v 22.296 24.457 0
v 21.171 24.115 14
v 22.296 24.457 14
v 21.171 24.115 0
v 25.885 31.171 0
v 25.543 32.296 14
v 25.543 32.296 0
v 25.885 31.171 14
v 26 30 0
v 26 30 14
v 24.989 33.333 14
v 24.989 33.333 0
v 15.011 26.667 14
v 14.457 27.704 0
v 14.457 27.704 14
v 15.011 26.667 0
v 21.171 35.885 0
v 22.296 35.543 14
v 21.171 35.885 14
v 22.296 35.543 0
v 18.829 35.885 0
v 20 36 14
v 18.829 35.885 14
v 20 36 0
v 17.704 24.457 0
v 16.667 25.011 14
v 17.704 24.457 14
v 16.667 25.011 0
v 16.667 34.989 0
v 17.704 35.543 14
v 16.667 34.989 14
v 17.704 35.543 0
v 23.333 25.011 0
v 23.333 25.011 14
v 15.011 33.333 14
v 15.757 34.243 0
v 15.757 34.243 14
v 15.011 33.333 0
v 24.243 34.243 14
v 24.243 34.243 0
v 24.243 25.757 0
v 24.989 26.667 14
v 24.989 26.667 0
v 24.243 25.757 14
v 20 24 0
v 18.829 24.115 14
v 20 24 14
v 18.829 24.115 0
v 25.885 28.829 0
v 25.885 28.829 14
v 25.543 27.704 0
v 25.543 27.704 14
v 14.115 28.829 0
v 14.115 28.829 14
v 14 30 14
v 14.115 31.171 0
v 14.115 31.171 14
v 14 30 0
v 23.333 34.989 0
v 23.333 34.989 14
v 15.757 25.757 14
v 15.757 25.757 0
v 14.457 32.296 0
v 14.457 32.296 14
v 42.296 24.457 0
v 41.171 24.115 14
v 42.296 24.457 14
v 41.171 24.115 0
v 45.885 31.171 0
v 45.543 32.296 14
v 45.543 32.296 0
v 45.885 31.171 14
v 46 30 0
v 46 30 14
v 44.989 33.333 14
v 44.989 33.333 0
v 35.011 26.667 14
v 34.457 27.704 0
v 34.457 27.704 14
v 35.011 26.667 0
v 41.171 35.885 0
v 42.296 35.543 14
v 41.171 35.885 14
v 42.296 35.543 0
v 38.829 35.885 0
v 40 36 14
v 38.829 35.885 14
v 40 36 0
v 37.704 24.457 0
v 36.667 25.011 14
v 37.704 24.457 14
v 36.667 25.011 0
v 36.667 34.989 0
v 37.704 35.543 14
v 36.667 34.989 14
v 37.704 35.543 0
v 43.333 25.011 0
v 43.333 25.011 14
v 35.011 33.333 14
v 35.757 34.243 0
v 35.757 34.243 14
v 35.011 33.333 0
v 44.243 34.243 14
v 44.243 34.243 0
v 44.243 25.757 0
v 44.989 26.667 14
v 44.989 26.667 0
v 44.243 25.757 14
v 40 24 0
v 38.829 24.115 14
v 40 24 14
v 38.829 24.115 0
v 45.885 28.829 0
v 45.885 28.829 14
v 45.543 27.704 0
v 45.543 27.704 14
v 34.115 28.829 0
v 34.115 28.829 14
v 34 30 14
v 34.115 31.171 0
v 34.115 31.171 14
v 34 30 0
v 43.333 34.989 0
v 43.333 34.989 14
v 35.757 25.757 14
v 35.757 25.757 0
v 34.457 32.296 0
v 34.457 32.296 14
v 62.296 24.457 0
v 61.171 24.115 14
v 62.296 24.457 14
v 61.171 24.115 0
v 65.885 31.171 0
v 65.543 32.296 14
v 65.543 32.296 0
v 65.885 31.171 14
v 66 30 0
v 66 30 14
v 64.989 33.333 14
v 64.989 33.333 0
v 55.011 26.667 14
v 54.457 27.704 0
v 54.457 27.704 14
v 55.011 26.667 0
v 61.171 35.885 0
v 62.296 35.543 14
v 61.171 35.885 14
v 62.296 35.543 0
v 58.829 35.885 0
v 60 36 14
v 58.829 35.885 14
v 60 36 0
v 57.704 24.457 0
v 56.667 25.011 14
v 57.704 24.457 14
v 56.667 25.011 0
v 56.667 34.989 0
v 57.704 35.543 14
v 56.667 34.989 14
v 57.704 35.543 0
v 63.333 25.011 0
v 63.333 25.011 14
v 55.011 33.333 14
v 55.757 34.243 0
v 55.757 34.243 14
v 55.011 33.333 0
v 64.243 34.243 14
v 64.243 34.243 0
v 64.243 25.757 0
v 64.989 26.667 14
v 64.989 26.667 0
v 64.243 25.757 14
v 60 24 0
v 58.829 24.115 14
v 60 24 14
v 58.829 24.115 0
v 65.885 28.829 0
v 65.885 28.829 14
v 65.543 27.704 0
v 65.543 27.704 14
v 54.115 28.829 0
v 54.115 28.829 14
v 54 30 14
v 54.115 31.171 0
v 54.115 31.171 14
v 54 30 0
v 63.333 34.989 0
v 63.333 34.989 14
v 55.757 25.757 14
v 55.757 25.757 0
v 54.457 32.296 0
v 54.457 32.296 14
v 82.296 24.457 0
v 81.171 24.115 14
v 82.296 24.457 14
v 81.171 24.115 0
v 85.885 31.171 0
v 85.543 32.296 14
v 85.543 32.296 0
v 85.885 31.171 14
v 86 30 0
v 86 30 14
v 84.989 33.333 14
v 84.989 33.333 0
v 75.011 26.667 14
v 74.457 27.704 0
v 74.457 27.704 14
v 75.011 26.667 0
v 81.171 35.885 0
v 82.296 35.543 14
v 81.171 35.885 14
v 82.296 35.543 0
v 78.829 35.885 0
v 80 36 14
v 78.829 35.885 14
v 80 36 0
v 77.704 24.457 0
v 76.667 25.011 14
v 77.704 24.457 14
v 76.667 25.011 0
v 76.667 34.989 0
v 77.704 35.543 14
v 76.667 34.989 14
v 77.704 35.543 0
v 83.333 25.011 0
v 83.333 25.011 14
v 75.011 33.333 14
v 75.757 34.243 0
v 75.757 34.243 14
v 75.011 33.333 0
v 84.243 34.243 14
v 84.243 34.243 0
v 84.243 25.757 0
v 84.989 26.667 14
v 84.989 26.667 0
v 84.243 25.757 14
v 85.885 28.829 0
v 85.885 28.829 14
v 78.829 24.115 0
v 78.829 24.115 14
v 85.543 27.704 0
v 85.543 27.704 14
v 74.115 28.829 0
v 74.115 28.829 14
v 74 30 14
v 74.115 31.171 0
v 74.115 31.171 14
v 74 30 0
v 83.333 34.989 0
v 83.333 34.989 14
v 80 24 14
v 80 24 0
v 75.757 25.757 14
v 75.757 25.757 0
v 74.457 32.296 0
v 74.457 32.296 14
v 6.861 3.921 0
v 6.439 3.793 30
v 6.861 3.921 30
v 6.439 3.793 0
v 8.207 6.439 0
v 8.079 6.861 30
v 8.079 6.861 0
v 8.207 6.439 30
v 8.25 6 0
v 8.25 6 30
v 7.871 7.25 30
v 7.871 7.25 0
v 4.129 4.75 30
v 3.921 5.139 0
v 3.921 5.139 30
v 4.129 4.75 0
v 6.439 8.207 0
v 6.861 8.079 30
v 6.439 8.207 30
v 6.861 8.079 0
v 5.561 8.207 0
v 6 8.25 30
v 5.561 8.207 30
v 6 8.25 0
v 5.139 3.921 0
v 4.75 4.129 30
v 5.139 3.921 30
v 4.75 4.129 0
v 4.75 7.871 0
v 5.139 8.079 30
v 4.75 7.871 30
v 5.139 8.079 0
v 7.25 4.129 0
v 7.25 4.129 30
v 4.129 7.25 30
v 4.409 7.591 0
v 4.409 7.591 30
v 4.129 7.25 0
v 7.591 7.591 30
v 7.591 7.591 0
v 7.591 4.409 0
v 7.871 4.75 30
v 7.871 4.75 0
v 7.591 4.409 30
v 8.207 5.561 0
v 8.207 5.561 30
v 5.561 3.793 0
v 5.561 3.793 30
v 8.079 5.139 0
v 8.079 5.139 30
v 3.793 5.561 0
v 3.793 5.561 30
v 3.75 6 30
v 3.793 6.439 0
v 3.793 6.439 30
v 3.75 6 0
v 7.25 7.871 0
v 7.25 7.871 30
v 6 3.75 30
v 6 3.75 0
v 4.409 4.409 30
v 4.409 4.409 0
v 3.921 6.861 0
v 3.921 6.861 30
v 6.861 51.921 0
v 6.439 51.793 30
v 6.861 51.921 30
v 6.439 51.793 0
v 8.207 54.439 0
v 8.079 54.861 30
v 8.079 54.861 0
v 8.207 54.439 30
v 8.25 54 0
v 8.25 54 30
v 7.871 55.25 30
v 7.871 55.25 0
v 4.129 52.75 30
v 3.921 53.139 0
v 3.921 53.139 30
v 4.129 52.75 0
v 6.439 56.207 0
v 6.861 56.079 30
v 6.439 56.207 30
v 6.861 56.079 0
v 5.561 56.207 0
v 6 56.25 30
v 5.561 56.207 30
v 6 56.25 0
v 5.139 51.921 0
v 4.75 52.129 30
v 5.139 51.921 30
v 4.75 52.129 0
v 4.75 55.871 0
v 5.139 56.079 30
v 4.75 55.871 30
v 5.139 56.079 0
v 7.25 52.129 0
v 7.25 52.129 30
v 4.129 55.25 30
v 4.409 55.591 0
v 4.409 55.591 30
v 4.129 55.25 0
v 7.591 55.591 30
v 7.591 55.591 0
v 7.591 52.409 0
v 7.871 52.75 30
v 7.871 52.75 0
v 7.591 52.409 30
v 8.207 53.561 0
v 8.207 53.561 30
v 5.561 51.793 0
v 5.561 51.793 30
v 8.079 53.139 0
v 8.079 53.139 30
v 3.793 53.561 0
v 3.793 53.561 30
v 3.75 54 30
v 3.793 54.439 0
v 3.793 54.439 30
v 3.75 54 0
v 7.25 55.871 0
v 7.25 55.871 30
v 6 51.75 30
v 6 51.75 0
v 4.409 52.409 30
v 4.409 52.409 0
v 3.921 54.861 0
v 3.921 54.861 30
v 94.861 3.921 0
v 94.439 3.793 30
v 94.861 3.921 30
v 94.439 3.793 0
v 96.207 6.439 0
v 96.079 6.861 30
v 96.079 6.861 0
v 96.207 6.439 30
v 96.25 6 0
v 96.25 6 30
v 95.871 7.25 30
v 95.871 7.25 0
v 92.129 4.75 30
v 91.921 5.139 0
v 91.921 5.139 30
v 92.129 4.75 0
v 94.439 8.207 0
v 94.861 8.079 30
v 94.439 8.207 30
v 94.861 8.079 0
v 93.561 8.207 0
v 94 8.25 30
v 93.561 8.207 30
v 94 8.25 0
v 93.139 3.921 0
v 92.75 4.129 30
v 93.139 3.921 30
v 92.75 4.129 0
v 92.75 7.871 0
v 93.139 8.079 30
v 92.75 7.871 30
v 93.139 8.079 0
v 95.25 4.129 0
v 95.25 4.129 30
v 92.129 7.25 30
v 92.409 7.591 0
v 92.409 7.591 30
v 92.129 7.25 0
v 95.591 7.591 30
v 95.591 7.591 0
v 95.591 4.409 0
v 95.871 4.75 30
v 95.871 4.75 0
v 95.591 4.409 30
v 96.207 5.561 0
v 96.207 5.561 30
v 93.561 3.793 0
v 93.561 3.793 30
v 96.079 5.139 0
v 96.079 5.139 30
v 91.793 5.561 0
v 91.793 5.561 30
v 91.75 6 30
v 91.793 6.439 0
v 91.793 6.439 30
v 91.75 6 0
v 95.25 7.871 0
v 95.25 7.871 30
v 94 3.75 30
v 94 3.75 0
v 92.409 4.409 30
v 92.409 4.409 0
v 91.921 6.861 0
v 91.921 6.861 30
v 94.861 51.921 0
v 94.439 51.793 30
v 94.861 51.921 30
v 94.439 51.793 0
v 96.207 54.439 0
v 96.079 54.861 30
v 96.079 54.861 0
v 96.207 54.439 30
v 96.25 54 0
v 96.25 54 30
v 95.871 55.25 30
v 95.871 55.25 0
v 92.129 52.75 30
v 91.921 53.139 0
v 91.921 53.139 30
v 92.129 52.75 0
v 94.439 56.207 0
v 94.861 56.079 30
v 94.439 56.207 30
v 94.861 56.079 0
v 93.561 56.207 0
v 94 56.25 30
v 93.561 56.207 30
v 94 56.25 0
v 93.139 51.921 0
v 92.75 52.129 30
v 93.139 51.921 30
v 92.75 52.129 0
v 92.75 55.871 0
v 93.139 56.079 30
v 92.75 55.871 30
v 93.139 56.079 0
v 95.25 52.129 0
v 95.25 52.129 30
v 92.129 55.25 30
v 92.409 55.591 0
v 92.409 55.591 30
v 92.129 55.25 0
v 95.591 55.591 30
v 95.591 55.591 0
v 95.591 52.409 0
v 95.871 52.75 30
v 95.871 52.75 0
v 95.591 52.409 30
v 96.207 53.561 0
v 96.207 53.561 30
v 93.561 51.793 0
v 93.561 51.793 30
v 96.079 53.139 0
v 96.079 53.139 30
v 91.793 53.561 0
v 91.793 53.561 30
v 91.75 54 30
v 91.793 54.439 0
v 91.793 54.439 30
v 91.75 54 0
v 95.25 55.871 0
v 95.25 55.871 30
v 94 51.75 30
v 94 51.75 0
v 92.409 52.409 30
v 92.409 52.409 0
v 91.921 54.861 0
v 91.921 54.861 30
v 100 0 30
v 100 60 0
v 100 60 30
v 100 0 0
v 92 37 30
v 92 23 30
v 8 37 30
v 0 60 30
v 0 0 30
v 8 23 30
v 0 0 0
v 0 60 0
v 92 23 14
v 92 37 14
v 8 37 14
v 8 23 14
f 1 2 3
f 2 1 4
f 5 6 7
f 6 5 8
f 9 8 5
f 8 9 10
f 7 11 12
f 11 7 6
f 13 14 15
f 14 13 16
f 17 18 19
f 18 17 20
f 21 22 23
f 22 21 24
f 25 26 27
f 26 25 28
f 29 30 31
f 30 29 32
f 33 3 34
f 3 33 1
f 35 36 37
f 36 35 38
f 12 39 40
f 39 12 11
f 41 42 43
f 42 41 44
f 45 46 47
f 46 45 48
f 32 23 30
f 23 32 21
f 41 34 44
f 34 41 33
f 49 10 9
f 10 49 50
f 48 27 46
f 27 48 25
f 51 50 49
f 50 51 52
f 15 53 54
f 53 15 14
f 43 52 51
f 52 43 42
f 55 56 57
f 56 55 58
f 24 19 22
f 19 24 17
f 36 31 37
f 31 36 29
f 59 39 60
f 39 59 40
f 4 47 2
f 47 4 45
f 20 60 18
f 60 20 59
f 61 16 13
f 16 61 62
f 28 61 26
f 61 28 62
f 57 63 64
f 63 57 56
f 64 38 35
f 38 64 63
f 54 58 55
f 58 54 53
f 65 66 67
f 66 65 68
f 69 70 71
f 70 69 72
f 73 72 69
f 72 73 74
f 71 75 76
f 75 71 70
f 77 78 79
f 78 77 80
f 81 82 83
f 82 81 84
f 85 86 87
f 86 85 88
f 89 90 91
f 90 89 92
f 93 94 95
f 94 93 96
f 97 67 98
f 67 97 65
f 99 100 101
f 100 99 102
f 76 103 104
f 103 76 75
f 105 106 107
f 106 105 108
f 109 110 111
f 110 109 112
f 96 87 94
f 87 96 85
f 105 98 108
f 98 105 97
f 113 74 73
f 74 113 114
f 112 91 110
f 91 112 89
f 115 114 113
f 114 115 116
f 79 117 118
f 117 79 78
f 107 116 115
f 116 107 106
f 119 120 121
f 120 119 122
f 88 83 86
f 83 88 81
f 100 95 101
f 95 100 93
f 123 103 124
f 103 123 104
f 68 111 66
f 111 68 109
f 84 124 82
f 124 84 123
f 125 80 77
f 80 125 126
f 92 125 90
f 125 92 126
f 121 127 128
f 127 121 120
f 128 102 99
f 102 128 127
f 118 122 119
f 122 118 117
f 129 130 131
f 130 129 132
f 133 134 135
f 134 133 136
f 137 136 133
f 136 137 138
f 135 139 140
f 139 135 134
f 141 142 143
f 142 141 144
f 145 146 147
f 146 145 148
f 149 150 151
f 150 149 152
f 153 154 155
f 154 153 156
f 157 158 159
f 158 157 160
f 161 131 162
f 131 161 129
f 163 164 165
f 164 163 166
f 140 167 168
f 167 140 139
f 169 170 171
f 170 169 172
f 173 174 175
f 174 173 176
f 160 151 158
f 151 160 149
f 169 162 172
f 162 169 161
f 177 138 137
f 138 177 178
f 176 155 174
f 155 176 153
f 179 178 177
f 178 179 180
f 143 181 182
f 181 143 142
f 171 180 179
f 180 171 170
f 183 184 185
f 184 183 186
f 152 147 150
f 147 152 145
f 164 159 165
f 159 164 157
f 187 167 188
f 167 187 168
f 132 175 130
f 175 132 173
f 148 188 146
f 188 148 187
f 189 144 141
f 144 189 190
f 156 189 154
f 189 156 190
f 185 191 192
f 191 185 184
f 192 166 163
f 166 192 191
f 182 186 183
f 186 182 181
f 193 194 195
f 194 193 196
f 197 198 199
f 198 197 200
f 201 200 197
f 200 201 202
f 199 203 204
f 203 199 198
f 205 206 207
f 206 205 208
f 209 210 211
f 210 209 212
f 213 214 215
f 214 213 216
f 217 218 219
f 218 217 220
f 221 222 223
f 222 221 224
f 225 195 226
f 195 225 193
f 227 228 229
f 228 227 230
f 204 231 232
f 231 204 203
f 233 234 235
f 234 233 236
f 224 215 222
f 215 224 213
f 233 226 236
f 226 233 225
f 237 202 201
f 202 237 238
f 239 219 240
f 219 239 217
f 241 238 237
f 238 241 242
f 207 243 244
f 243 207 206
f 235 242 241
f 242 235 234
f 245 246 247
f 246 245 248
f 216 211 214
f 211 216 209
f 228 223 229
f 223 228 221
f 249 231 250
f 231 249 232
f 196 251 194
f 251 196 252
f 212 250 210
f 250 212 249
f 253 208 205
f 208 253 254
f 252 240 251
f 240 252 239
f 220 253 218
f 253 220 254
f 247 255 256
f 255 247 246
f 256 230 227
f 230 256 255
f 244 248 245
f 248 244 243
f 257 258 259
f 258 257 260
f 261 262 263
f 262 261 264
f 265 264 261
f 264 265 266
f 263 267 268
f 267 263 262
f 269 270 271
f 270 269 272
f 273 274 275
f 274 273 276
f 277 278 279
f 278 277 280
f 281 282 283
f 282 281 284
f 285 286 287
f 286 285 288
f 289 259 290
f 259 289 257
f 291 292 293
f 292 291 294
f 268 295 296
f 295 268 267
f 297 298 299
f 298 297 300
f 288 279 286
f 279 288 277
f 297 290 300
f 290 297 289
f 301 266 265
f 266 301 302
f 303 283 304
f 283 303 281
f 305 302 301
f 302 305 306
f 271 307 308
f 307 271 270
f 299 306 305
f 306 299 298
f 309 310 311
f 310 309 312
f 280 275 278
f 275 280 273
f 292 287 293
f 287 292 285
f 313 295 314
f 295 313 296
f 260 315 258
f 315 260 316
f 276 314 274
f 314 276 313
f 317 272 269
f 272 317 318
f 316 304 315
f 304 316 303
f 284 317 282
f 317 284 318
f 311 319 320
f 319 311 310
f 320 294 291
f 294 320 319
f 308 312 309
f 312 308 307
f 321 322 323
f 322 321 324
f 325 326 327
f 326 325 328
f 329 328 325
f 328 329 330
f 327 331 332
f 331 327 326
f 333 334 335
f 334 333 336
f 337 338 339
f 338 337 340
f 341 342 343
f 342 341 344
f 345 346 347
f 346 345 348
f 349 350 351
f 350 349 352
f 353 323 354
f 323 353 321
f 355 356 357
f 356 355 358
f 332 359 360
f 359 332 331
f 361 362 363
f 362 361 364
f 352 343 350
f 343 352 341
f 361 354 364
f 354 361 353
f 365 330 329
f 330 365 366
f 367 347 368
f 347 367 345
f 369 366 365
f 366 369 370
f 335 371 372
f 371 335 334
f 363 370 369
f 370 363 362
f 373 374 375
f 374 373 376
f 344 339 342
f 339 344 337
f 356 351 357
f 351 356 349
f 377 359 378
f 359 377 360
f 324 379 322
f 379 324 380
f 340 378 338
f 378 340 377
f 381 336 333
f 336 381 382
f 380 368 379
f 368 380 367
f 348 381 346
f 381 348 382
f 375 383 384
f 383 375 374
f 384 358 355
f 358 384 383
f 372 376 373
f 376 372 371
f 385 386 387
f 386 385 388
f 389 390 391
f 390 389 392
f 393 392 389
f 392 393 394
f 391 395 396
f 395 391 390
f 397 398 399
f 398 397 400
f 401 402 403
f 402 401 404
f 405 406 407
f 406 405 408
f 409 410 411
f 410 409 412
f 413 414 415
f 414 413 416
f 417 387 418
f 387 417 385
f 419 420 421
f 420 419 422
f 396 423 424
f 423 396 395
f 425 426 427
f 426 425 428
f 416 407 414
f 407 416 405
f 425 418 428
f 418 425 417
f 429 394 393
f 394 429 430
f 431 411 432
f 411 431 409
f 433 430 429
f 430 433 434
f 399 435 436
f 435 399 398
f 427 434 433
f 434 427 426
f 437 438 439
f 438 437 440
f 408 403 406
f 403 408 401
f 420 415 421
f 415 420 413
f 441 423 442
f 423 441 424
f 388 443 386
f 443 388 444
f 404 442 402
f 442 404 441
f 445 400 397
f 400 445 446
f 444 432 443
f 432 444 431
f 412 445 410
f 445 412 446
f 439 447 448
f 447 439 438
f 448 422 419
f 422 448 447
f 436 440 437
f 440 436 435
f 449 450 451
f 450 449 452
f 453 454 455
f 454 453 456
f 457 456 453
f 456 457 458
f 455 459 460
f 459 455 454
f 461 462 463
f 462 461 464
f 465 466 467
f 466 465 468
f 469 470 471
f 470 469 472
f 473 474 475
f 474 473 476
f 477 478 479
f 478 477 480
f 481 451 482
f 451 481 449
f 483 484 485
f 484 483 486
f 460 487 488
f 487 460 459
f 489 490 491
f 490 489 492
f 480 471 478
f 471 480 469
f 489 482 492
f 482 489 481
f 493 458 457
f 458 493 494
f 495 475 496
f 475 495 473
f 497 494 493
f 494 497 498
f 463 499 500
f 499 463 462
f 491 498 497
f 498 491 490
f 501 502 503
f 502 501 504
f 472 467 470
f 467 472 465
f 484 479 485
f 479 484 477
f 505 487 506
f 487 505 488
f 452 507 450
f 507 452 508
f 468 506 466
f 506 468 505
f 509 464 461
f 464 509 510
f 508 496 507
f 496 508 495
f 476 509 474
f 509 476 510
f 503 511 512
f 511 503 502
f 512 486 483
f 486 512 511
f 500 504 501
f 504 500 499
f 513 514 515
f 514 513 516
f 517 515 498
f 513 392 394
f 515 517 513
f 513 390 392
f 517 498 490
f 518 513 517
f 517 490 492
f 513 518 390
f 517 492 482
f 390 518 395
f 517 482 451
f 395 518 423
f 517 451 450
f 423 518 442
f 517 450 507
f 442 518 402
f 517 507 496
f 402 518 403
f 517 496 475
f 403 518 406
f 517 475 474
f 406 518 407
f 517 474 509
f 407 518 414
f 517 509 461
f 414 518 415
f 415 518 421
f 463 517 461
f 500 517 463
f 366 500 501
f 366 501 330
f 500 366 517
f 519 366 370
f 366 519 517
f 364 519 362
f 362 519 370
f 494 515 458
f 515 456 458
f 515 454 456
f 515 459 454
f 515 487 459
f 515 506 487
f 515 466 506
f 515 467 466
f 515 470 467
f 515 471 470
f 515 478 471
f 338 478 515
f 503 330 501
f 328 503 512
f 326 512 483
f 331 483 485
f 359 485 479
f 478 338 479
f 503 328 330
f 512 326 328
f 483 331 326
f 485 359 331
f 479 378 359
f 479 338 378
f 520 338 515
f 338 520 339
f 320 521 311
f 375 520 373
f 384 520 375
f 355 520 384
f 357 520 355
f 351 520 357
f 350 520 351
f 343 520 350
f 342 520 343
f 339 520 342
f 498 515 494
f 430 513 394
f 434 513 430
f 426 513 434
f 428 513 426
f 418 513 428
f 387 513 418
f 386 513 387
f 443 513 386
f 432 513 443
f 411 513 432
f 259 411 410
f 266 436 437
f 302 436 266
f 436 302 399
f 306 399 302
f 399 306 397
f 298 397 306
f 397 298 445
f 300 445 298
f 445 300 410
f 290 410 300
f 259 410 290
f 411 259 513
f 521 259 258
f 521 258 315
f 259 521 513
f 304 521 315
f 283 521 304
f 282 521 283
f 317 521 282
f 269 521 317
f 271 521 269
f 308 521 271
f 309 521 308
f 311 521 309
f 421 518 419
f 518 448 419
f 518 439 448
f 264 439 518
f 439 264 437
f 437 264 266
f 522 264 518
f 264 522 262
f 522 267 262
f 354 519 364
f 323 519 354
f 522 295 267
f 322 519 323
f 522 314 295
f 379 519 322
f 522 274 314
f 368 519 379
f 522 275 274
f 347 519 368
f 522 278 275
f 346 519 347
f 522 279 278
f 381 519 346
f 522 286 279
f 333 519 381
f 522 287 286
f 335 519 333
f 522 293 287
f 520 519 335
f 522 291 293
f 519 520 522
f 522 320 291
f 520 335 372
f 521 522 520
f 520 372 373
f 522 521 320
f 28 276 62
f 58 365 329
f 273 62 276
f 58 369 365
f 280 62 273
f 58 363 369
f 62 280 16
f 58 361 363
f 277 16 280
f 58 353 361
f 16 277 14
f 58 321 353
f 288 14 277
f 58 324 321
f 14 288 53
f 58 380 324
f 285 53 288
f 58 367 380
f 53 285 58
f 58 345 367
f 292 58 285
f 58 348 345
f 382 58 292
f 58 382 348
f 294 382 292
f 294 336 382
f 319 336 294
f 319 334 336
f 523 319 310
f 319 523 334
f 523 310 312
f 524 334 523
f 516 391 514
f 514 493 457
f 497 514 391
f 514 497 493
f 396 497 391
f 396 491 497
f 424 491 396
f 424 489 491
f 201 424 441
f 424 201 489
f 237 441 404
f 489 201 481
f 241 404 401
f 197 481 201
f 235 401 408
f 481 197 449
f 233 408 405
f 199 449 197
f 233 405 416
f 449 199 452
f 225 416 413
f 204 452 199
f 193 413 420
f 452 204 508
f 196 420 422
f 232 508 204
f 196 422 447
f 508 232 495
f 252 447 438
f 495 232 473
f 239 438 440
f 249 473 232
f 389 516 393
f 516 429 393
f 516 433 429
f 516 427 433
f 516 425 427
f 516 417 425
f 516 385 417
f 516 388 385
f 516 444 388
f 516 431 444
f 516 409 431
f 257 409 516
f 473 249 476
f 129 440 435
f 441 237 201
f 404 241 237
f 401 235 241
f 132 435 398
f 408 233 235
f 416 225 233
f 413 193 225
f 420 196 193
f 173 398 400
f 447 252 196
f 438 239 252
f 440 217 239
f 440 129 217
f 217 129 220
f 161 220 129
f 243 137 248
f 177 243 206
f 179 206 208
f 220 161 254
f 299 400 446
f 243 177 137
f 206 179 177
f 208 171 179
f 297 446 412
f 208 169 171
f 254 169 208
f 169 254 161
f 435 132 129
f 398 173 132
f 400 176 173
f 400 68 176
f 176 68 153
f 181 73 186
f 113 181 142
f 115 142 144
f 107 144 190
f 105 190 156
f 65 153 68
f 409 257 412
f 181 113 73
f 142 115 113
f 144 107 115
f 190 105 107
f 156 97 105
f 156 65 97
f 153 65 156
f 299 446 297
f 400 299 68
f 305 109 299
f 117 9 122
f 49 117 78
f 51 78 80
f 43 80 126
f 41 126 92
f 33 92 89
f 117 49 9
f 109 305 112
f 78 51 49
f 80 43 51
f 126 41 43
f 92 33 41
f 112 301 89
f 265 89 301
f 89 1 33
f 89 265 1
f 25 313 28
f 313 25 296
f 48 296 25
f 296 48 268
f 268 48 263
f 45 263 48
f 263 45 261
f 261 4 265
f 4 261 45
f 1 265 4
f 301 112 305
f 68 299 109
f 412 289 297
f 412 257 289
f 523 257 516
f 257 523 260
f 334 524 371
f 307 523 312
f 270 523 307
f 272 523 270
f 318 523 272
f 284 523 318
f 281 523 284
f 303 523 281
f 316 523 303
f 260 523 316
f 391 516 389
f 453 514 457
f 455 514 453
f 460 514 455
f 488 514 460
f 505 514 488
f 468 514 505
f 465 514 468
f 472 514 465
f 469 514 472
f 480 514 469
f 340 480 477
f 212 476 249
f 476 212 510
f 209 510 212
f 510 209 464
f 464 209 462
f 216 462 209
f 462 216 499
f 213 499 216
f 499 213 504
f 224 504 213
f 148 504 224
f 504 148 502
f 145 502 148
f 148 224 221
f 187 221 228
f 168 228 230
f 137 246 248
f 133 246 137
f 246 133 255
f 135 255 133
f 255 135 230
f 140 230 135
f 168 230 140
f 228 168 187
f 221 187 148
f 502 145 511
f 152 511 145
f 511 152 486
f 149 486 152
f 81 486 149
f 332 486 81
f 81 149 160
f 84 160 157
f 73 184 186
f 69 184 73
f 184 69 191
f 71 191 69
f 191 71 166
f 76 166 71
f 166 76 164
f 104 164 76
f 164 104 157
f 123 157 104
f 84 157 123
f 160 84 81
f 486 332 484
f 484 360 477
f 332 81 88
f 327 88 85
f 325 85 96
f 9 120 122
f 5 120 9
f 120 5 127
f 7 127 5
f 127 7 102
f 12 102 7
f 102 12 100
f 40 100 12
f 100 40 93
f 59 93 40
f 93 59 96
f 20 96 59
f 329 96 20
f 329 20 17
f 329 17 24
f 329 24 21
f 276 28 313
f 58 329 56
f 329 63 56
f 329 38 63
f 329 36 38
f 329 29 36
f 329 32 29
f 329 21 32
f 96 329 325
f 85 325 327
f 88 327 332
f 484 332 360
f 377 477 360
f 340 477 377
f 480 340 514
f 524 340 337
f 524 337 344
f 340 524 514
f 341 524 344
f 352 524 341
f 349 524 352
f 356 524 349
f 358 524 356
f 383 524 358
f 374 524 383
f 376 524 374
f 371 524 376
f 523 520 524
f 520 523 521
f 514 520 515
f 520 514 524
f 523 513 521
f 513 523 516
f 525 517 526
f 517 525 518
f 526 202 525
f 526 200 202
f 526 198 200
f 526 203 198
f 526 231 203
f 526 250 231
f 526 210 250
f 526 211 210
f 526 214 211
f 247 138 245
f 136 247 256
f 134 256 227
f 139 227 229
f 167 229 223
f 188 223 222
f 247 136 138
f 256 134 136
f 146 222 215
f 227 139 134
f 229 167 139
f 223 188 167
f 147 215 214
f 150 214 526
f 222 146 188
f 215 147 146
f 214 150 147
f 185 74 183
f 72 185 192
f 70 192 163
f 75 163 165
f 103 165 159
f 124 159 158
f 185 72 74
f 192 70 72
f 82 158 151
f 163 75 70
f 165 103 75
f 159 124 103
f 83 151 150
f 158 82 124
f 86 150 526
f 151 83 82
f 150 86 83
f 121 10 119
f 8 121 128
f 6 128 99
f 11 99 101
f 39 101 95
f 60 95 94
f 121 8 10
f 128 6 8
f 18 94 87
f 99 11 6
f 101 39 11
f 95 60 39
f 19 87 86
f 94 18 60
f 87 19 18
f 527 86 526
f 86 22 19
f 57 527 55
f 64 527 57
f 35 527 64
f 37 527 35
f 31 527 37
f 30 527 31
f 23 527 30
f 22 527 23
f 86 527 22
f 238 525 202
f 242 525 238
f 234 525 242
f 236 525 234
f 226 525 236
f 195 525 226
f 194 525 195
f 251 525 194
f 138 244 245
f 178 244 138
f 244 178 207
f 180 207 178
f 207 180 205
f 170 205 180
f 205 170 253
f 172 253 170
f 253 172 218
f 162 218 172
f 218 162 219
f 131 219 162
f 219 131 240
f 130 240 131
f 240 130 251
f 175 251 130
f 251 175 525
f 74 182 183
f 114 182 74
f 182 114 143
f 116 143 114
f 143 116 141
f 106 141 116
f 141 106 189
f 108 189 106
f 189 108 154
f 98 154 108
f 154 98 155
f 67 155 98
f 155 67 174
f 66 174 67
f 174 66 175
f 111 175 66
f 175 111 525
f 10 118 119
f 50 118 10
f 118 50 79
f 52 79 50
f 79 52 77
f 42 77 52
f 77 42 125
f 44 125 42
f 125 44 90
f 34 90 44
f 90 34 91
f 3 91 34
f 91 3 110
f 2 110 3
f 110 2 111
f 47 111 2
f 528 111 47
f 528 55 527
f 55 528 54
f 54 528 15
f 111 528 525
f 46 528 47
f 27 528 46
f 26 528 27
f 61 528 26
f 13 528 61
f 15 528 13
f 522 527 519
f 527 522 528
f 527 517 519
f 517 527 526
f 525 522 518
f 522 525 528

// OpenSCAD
$fn = 32;

// ----------------------------------------------------------------------
// Manifold block: gallery_top manifold
// ----------------------------------------------------------------------

// --- parameters (mm) ---
block_l = 100;            // block length, X
block_w = 60;             // block width, Y
block_h = 30;             // block height, Z
port_d = 12;              // port bore diameter
port_pitch = 20;          // port pitch along X
gallery_d = 14;           // top gallery width, Y
gallery_depth = 16;       // gallery pocket depth
wall_p = 8;               // gallery end wall thickness, X
mnt_d = 4.5;              // mounting hole diameter
mnt_in = 6;               // mounting hole inset from the edges

n_ports = 4;  // ports in the row
port_x0 = (block_l - (n_ports - 1) * port_pitch) / 2;  // first port X

difference() {
  cube([block_l, block_w, block_h]);
  for (i = [0 : n_ports - 1])
    translate([port_x0 + i * port_pitch, block_w / 2, -1])
      cylinder(h = block_h + 2, d = port_d);
  translate([wall_p, block_w / 2 - gallery_d / 2, block_h - gallery_depth])
    cube([block_l - 2 * wall_p, gallery_d, gallery_depth + 1]);
  for (cx = [mnt_in, block_l - mnt_in])
    for (cy = [mnt_in, block_w - mnt_in])
      translate([cx, cy, -1]) cylinder(h = block_h + 2, d = mnt_d);
}
